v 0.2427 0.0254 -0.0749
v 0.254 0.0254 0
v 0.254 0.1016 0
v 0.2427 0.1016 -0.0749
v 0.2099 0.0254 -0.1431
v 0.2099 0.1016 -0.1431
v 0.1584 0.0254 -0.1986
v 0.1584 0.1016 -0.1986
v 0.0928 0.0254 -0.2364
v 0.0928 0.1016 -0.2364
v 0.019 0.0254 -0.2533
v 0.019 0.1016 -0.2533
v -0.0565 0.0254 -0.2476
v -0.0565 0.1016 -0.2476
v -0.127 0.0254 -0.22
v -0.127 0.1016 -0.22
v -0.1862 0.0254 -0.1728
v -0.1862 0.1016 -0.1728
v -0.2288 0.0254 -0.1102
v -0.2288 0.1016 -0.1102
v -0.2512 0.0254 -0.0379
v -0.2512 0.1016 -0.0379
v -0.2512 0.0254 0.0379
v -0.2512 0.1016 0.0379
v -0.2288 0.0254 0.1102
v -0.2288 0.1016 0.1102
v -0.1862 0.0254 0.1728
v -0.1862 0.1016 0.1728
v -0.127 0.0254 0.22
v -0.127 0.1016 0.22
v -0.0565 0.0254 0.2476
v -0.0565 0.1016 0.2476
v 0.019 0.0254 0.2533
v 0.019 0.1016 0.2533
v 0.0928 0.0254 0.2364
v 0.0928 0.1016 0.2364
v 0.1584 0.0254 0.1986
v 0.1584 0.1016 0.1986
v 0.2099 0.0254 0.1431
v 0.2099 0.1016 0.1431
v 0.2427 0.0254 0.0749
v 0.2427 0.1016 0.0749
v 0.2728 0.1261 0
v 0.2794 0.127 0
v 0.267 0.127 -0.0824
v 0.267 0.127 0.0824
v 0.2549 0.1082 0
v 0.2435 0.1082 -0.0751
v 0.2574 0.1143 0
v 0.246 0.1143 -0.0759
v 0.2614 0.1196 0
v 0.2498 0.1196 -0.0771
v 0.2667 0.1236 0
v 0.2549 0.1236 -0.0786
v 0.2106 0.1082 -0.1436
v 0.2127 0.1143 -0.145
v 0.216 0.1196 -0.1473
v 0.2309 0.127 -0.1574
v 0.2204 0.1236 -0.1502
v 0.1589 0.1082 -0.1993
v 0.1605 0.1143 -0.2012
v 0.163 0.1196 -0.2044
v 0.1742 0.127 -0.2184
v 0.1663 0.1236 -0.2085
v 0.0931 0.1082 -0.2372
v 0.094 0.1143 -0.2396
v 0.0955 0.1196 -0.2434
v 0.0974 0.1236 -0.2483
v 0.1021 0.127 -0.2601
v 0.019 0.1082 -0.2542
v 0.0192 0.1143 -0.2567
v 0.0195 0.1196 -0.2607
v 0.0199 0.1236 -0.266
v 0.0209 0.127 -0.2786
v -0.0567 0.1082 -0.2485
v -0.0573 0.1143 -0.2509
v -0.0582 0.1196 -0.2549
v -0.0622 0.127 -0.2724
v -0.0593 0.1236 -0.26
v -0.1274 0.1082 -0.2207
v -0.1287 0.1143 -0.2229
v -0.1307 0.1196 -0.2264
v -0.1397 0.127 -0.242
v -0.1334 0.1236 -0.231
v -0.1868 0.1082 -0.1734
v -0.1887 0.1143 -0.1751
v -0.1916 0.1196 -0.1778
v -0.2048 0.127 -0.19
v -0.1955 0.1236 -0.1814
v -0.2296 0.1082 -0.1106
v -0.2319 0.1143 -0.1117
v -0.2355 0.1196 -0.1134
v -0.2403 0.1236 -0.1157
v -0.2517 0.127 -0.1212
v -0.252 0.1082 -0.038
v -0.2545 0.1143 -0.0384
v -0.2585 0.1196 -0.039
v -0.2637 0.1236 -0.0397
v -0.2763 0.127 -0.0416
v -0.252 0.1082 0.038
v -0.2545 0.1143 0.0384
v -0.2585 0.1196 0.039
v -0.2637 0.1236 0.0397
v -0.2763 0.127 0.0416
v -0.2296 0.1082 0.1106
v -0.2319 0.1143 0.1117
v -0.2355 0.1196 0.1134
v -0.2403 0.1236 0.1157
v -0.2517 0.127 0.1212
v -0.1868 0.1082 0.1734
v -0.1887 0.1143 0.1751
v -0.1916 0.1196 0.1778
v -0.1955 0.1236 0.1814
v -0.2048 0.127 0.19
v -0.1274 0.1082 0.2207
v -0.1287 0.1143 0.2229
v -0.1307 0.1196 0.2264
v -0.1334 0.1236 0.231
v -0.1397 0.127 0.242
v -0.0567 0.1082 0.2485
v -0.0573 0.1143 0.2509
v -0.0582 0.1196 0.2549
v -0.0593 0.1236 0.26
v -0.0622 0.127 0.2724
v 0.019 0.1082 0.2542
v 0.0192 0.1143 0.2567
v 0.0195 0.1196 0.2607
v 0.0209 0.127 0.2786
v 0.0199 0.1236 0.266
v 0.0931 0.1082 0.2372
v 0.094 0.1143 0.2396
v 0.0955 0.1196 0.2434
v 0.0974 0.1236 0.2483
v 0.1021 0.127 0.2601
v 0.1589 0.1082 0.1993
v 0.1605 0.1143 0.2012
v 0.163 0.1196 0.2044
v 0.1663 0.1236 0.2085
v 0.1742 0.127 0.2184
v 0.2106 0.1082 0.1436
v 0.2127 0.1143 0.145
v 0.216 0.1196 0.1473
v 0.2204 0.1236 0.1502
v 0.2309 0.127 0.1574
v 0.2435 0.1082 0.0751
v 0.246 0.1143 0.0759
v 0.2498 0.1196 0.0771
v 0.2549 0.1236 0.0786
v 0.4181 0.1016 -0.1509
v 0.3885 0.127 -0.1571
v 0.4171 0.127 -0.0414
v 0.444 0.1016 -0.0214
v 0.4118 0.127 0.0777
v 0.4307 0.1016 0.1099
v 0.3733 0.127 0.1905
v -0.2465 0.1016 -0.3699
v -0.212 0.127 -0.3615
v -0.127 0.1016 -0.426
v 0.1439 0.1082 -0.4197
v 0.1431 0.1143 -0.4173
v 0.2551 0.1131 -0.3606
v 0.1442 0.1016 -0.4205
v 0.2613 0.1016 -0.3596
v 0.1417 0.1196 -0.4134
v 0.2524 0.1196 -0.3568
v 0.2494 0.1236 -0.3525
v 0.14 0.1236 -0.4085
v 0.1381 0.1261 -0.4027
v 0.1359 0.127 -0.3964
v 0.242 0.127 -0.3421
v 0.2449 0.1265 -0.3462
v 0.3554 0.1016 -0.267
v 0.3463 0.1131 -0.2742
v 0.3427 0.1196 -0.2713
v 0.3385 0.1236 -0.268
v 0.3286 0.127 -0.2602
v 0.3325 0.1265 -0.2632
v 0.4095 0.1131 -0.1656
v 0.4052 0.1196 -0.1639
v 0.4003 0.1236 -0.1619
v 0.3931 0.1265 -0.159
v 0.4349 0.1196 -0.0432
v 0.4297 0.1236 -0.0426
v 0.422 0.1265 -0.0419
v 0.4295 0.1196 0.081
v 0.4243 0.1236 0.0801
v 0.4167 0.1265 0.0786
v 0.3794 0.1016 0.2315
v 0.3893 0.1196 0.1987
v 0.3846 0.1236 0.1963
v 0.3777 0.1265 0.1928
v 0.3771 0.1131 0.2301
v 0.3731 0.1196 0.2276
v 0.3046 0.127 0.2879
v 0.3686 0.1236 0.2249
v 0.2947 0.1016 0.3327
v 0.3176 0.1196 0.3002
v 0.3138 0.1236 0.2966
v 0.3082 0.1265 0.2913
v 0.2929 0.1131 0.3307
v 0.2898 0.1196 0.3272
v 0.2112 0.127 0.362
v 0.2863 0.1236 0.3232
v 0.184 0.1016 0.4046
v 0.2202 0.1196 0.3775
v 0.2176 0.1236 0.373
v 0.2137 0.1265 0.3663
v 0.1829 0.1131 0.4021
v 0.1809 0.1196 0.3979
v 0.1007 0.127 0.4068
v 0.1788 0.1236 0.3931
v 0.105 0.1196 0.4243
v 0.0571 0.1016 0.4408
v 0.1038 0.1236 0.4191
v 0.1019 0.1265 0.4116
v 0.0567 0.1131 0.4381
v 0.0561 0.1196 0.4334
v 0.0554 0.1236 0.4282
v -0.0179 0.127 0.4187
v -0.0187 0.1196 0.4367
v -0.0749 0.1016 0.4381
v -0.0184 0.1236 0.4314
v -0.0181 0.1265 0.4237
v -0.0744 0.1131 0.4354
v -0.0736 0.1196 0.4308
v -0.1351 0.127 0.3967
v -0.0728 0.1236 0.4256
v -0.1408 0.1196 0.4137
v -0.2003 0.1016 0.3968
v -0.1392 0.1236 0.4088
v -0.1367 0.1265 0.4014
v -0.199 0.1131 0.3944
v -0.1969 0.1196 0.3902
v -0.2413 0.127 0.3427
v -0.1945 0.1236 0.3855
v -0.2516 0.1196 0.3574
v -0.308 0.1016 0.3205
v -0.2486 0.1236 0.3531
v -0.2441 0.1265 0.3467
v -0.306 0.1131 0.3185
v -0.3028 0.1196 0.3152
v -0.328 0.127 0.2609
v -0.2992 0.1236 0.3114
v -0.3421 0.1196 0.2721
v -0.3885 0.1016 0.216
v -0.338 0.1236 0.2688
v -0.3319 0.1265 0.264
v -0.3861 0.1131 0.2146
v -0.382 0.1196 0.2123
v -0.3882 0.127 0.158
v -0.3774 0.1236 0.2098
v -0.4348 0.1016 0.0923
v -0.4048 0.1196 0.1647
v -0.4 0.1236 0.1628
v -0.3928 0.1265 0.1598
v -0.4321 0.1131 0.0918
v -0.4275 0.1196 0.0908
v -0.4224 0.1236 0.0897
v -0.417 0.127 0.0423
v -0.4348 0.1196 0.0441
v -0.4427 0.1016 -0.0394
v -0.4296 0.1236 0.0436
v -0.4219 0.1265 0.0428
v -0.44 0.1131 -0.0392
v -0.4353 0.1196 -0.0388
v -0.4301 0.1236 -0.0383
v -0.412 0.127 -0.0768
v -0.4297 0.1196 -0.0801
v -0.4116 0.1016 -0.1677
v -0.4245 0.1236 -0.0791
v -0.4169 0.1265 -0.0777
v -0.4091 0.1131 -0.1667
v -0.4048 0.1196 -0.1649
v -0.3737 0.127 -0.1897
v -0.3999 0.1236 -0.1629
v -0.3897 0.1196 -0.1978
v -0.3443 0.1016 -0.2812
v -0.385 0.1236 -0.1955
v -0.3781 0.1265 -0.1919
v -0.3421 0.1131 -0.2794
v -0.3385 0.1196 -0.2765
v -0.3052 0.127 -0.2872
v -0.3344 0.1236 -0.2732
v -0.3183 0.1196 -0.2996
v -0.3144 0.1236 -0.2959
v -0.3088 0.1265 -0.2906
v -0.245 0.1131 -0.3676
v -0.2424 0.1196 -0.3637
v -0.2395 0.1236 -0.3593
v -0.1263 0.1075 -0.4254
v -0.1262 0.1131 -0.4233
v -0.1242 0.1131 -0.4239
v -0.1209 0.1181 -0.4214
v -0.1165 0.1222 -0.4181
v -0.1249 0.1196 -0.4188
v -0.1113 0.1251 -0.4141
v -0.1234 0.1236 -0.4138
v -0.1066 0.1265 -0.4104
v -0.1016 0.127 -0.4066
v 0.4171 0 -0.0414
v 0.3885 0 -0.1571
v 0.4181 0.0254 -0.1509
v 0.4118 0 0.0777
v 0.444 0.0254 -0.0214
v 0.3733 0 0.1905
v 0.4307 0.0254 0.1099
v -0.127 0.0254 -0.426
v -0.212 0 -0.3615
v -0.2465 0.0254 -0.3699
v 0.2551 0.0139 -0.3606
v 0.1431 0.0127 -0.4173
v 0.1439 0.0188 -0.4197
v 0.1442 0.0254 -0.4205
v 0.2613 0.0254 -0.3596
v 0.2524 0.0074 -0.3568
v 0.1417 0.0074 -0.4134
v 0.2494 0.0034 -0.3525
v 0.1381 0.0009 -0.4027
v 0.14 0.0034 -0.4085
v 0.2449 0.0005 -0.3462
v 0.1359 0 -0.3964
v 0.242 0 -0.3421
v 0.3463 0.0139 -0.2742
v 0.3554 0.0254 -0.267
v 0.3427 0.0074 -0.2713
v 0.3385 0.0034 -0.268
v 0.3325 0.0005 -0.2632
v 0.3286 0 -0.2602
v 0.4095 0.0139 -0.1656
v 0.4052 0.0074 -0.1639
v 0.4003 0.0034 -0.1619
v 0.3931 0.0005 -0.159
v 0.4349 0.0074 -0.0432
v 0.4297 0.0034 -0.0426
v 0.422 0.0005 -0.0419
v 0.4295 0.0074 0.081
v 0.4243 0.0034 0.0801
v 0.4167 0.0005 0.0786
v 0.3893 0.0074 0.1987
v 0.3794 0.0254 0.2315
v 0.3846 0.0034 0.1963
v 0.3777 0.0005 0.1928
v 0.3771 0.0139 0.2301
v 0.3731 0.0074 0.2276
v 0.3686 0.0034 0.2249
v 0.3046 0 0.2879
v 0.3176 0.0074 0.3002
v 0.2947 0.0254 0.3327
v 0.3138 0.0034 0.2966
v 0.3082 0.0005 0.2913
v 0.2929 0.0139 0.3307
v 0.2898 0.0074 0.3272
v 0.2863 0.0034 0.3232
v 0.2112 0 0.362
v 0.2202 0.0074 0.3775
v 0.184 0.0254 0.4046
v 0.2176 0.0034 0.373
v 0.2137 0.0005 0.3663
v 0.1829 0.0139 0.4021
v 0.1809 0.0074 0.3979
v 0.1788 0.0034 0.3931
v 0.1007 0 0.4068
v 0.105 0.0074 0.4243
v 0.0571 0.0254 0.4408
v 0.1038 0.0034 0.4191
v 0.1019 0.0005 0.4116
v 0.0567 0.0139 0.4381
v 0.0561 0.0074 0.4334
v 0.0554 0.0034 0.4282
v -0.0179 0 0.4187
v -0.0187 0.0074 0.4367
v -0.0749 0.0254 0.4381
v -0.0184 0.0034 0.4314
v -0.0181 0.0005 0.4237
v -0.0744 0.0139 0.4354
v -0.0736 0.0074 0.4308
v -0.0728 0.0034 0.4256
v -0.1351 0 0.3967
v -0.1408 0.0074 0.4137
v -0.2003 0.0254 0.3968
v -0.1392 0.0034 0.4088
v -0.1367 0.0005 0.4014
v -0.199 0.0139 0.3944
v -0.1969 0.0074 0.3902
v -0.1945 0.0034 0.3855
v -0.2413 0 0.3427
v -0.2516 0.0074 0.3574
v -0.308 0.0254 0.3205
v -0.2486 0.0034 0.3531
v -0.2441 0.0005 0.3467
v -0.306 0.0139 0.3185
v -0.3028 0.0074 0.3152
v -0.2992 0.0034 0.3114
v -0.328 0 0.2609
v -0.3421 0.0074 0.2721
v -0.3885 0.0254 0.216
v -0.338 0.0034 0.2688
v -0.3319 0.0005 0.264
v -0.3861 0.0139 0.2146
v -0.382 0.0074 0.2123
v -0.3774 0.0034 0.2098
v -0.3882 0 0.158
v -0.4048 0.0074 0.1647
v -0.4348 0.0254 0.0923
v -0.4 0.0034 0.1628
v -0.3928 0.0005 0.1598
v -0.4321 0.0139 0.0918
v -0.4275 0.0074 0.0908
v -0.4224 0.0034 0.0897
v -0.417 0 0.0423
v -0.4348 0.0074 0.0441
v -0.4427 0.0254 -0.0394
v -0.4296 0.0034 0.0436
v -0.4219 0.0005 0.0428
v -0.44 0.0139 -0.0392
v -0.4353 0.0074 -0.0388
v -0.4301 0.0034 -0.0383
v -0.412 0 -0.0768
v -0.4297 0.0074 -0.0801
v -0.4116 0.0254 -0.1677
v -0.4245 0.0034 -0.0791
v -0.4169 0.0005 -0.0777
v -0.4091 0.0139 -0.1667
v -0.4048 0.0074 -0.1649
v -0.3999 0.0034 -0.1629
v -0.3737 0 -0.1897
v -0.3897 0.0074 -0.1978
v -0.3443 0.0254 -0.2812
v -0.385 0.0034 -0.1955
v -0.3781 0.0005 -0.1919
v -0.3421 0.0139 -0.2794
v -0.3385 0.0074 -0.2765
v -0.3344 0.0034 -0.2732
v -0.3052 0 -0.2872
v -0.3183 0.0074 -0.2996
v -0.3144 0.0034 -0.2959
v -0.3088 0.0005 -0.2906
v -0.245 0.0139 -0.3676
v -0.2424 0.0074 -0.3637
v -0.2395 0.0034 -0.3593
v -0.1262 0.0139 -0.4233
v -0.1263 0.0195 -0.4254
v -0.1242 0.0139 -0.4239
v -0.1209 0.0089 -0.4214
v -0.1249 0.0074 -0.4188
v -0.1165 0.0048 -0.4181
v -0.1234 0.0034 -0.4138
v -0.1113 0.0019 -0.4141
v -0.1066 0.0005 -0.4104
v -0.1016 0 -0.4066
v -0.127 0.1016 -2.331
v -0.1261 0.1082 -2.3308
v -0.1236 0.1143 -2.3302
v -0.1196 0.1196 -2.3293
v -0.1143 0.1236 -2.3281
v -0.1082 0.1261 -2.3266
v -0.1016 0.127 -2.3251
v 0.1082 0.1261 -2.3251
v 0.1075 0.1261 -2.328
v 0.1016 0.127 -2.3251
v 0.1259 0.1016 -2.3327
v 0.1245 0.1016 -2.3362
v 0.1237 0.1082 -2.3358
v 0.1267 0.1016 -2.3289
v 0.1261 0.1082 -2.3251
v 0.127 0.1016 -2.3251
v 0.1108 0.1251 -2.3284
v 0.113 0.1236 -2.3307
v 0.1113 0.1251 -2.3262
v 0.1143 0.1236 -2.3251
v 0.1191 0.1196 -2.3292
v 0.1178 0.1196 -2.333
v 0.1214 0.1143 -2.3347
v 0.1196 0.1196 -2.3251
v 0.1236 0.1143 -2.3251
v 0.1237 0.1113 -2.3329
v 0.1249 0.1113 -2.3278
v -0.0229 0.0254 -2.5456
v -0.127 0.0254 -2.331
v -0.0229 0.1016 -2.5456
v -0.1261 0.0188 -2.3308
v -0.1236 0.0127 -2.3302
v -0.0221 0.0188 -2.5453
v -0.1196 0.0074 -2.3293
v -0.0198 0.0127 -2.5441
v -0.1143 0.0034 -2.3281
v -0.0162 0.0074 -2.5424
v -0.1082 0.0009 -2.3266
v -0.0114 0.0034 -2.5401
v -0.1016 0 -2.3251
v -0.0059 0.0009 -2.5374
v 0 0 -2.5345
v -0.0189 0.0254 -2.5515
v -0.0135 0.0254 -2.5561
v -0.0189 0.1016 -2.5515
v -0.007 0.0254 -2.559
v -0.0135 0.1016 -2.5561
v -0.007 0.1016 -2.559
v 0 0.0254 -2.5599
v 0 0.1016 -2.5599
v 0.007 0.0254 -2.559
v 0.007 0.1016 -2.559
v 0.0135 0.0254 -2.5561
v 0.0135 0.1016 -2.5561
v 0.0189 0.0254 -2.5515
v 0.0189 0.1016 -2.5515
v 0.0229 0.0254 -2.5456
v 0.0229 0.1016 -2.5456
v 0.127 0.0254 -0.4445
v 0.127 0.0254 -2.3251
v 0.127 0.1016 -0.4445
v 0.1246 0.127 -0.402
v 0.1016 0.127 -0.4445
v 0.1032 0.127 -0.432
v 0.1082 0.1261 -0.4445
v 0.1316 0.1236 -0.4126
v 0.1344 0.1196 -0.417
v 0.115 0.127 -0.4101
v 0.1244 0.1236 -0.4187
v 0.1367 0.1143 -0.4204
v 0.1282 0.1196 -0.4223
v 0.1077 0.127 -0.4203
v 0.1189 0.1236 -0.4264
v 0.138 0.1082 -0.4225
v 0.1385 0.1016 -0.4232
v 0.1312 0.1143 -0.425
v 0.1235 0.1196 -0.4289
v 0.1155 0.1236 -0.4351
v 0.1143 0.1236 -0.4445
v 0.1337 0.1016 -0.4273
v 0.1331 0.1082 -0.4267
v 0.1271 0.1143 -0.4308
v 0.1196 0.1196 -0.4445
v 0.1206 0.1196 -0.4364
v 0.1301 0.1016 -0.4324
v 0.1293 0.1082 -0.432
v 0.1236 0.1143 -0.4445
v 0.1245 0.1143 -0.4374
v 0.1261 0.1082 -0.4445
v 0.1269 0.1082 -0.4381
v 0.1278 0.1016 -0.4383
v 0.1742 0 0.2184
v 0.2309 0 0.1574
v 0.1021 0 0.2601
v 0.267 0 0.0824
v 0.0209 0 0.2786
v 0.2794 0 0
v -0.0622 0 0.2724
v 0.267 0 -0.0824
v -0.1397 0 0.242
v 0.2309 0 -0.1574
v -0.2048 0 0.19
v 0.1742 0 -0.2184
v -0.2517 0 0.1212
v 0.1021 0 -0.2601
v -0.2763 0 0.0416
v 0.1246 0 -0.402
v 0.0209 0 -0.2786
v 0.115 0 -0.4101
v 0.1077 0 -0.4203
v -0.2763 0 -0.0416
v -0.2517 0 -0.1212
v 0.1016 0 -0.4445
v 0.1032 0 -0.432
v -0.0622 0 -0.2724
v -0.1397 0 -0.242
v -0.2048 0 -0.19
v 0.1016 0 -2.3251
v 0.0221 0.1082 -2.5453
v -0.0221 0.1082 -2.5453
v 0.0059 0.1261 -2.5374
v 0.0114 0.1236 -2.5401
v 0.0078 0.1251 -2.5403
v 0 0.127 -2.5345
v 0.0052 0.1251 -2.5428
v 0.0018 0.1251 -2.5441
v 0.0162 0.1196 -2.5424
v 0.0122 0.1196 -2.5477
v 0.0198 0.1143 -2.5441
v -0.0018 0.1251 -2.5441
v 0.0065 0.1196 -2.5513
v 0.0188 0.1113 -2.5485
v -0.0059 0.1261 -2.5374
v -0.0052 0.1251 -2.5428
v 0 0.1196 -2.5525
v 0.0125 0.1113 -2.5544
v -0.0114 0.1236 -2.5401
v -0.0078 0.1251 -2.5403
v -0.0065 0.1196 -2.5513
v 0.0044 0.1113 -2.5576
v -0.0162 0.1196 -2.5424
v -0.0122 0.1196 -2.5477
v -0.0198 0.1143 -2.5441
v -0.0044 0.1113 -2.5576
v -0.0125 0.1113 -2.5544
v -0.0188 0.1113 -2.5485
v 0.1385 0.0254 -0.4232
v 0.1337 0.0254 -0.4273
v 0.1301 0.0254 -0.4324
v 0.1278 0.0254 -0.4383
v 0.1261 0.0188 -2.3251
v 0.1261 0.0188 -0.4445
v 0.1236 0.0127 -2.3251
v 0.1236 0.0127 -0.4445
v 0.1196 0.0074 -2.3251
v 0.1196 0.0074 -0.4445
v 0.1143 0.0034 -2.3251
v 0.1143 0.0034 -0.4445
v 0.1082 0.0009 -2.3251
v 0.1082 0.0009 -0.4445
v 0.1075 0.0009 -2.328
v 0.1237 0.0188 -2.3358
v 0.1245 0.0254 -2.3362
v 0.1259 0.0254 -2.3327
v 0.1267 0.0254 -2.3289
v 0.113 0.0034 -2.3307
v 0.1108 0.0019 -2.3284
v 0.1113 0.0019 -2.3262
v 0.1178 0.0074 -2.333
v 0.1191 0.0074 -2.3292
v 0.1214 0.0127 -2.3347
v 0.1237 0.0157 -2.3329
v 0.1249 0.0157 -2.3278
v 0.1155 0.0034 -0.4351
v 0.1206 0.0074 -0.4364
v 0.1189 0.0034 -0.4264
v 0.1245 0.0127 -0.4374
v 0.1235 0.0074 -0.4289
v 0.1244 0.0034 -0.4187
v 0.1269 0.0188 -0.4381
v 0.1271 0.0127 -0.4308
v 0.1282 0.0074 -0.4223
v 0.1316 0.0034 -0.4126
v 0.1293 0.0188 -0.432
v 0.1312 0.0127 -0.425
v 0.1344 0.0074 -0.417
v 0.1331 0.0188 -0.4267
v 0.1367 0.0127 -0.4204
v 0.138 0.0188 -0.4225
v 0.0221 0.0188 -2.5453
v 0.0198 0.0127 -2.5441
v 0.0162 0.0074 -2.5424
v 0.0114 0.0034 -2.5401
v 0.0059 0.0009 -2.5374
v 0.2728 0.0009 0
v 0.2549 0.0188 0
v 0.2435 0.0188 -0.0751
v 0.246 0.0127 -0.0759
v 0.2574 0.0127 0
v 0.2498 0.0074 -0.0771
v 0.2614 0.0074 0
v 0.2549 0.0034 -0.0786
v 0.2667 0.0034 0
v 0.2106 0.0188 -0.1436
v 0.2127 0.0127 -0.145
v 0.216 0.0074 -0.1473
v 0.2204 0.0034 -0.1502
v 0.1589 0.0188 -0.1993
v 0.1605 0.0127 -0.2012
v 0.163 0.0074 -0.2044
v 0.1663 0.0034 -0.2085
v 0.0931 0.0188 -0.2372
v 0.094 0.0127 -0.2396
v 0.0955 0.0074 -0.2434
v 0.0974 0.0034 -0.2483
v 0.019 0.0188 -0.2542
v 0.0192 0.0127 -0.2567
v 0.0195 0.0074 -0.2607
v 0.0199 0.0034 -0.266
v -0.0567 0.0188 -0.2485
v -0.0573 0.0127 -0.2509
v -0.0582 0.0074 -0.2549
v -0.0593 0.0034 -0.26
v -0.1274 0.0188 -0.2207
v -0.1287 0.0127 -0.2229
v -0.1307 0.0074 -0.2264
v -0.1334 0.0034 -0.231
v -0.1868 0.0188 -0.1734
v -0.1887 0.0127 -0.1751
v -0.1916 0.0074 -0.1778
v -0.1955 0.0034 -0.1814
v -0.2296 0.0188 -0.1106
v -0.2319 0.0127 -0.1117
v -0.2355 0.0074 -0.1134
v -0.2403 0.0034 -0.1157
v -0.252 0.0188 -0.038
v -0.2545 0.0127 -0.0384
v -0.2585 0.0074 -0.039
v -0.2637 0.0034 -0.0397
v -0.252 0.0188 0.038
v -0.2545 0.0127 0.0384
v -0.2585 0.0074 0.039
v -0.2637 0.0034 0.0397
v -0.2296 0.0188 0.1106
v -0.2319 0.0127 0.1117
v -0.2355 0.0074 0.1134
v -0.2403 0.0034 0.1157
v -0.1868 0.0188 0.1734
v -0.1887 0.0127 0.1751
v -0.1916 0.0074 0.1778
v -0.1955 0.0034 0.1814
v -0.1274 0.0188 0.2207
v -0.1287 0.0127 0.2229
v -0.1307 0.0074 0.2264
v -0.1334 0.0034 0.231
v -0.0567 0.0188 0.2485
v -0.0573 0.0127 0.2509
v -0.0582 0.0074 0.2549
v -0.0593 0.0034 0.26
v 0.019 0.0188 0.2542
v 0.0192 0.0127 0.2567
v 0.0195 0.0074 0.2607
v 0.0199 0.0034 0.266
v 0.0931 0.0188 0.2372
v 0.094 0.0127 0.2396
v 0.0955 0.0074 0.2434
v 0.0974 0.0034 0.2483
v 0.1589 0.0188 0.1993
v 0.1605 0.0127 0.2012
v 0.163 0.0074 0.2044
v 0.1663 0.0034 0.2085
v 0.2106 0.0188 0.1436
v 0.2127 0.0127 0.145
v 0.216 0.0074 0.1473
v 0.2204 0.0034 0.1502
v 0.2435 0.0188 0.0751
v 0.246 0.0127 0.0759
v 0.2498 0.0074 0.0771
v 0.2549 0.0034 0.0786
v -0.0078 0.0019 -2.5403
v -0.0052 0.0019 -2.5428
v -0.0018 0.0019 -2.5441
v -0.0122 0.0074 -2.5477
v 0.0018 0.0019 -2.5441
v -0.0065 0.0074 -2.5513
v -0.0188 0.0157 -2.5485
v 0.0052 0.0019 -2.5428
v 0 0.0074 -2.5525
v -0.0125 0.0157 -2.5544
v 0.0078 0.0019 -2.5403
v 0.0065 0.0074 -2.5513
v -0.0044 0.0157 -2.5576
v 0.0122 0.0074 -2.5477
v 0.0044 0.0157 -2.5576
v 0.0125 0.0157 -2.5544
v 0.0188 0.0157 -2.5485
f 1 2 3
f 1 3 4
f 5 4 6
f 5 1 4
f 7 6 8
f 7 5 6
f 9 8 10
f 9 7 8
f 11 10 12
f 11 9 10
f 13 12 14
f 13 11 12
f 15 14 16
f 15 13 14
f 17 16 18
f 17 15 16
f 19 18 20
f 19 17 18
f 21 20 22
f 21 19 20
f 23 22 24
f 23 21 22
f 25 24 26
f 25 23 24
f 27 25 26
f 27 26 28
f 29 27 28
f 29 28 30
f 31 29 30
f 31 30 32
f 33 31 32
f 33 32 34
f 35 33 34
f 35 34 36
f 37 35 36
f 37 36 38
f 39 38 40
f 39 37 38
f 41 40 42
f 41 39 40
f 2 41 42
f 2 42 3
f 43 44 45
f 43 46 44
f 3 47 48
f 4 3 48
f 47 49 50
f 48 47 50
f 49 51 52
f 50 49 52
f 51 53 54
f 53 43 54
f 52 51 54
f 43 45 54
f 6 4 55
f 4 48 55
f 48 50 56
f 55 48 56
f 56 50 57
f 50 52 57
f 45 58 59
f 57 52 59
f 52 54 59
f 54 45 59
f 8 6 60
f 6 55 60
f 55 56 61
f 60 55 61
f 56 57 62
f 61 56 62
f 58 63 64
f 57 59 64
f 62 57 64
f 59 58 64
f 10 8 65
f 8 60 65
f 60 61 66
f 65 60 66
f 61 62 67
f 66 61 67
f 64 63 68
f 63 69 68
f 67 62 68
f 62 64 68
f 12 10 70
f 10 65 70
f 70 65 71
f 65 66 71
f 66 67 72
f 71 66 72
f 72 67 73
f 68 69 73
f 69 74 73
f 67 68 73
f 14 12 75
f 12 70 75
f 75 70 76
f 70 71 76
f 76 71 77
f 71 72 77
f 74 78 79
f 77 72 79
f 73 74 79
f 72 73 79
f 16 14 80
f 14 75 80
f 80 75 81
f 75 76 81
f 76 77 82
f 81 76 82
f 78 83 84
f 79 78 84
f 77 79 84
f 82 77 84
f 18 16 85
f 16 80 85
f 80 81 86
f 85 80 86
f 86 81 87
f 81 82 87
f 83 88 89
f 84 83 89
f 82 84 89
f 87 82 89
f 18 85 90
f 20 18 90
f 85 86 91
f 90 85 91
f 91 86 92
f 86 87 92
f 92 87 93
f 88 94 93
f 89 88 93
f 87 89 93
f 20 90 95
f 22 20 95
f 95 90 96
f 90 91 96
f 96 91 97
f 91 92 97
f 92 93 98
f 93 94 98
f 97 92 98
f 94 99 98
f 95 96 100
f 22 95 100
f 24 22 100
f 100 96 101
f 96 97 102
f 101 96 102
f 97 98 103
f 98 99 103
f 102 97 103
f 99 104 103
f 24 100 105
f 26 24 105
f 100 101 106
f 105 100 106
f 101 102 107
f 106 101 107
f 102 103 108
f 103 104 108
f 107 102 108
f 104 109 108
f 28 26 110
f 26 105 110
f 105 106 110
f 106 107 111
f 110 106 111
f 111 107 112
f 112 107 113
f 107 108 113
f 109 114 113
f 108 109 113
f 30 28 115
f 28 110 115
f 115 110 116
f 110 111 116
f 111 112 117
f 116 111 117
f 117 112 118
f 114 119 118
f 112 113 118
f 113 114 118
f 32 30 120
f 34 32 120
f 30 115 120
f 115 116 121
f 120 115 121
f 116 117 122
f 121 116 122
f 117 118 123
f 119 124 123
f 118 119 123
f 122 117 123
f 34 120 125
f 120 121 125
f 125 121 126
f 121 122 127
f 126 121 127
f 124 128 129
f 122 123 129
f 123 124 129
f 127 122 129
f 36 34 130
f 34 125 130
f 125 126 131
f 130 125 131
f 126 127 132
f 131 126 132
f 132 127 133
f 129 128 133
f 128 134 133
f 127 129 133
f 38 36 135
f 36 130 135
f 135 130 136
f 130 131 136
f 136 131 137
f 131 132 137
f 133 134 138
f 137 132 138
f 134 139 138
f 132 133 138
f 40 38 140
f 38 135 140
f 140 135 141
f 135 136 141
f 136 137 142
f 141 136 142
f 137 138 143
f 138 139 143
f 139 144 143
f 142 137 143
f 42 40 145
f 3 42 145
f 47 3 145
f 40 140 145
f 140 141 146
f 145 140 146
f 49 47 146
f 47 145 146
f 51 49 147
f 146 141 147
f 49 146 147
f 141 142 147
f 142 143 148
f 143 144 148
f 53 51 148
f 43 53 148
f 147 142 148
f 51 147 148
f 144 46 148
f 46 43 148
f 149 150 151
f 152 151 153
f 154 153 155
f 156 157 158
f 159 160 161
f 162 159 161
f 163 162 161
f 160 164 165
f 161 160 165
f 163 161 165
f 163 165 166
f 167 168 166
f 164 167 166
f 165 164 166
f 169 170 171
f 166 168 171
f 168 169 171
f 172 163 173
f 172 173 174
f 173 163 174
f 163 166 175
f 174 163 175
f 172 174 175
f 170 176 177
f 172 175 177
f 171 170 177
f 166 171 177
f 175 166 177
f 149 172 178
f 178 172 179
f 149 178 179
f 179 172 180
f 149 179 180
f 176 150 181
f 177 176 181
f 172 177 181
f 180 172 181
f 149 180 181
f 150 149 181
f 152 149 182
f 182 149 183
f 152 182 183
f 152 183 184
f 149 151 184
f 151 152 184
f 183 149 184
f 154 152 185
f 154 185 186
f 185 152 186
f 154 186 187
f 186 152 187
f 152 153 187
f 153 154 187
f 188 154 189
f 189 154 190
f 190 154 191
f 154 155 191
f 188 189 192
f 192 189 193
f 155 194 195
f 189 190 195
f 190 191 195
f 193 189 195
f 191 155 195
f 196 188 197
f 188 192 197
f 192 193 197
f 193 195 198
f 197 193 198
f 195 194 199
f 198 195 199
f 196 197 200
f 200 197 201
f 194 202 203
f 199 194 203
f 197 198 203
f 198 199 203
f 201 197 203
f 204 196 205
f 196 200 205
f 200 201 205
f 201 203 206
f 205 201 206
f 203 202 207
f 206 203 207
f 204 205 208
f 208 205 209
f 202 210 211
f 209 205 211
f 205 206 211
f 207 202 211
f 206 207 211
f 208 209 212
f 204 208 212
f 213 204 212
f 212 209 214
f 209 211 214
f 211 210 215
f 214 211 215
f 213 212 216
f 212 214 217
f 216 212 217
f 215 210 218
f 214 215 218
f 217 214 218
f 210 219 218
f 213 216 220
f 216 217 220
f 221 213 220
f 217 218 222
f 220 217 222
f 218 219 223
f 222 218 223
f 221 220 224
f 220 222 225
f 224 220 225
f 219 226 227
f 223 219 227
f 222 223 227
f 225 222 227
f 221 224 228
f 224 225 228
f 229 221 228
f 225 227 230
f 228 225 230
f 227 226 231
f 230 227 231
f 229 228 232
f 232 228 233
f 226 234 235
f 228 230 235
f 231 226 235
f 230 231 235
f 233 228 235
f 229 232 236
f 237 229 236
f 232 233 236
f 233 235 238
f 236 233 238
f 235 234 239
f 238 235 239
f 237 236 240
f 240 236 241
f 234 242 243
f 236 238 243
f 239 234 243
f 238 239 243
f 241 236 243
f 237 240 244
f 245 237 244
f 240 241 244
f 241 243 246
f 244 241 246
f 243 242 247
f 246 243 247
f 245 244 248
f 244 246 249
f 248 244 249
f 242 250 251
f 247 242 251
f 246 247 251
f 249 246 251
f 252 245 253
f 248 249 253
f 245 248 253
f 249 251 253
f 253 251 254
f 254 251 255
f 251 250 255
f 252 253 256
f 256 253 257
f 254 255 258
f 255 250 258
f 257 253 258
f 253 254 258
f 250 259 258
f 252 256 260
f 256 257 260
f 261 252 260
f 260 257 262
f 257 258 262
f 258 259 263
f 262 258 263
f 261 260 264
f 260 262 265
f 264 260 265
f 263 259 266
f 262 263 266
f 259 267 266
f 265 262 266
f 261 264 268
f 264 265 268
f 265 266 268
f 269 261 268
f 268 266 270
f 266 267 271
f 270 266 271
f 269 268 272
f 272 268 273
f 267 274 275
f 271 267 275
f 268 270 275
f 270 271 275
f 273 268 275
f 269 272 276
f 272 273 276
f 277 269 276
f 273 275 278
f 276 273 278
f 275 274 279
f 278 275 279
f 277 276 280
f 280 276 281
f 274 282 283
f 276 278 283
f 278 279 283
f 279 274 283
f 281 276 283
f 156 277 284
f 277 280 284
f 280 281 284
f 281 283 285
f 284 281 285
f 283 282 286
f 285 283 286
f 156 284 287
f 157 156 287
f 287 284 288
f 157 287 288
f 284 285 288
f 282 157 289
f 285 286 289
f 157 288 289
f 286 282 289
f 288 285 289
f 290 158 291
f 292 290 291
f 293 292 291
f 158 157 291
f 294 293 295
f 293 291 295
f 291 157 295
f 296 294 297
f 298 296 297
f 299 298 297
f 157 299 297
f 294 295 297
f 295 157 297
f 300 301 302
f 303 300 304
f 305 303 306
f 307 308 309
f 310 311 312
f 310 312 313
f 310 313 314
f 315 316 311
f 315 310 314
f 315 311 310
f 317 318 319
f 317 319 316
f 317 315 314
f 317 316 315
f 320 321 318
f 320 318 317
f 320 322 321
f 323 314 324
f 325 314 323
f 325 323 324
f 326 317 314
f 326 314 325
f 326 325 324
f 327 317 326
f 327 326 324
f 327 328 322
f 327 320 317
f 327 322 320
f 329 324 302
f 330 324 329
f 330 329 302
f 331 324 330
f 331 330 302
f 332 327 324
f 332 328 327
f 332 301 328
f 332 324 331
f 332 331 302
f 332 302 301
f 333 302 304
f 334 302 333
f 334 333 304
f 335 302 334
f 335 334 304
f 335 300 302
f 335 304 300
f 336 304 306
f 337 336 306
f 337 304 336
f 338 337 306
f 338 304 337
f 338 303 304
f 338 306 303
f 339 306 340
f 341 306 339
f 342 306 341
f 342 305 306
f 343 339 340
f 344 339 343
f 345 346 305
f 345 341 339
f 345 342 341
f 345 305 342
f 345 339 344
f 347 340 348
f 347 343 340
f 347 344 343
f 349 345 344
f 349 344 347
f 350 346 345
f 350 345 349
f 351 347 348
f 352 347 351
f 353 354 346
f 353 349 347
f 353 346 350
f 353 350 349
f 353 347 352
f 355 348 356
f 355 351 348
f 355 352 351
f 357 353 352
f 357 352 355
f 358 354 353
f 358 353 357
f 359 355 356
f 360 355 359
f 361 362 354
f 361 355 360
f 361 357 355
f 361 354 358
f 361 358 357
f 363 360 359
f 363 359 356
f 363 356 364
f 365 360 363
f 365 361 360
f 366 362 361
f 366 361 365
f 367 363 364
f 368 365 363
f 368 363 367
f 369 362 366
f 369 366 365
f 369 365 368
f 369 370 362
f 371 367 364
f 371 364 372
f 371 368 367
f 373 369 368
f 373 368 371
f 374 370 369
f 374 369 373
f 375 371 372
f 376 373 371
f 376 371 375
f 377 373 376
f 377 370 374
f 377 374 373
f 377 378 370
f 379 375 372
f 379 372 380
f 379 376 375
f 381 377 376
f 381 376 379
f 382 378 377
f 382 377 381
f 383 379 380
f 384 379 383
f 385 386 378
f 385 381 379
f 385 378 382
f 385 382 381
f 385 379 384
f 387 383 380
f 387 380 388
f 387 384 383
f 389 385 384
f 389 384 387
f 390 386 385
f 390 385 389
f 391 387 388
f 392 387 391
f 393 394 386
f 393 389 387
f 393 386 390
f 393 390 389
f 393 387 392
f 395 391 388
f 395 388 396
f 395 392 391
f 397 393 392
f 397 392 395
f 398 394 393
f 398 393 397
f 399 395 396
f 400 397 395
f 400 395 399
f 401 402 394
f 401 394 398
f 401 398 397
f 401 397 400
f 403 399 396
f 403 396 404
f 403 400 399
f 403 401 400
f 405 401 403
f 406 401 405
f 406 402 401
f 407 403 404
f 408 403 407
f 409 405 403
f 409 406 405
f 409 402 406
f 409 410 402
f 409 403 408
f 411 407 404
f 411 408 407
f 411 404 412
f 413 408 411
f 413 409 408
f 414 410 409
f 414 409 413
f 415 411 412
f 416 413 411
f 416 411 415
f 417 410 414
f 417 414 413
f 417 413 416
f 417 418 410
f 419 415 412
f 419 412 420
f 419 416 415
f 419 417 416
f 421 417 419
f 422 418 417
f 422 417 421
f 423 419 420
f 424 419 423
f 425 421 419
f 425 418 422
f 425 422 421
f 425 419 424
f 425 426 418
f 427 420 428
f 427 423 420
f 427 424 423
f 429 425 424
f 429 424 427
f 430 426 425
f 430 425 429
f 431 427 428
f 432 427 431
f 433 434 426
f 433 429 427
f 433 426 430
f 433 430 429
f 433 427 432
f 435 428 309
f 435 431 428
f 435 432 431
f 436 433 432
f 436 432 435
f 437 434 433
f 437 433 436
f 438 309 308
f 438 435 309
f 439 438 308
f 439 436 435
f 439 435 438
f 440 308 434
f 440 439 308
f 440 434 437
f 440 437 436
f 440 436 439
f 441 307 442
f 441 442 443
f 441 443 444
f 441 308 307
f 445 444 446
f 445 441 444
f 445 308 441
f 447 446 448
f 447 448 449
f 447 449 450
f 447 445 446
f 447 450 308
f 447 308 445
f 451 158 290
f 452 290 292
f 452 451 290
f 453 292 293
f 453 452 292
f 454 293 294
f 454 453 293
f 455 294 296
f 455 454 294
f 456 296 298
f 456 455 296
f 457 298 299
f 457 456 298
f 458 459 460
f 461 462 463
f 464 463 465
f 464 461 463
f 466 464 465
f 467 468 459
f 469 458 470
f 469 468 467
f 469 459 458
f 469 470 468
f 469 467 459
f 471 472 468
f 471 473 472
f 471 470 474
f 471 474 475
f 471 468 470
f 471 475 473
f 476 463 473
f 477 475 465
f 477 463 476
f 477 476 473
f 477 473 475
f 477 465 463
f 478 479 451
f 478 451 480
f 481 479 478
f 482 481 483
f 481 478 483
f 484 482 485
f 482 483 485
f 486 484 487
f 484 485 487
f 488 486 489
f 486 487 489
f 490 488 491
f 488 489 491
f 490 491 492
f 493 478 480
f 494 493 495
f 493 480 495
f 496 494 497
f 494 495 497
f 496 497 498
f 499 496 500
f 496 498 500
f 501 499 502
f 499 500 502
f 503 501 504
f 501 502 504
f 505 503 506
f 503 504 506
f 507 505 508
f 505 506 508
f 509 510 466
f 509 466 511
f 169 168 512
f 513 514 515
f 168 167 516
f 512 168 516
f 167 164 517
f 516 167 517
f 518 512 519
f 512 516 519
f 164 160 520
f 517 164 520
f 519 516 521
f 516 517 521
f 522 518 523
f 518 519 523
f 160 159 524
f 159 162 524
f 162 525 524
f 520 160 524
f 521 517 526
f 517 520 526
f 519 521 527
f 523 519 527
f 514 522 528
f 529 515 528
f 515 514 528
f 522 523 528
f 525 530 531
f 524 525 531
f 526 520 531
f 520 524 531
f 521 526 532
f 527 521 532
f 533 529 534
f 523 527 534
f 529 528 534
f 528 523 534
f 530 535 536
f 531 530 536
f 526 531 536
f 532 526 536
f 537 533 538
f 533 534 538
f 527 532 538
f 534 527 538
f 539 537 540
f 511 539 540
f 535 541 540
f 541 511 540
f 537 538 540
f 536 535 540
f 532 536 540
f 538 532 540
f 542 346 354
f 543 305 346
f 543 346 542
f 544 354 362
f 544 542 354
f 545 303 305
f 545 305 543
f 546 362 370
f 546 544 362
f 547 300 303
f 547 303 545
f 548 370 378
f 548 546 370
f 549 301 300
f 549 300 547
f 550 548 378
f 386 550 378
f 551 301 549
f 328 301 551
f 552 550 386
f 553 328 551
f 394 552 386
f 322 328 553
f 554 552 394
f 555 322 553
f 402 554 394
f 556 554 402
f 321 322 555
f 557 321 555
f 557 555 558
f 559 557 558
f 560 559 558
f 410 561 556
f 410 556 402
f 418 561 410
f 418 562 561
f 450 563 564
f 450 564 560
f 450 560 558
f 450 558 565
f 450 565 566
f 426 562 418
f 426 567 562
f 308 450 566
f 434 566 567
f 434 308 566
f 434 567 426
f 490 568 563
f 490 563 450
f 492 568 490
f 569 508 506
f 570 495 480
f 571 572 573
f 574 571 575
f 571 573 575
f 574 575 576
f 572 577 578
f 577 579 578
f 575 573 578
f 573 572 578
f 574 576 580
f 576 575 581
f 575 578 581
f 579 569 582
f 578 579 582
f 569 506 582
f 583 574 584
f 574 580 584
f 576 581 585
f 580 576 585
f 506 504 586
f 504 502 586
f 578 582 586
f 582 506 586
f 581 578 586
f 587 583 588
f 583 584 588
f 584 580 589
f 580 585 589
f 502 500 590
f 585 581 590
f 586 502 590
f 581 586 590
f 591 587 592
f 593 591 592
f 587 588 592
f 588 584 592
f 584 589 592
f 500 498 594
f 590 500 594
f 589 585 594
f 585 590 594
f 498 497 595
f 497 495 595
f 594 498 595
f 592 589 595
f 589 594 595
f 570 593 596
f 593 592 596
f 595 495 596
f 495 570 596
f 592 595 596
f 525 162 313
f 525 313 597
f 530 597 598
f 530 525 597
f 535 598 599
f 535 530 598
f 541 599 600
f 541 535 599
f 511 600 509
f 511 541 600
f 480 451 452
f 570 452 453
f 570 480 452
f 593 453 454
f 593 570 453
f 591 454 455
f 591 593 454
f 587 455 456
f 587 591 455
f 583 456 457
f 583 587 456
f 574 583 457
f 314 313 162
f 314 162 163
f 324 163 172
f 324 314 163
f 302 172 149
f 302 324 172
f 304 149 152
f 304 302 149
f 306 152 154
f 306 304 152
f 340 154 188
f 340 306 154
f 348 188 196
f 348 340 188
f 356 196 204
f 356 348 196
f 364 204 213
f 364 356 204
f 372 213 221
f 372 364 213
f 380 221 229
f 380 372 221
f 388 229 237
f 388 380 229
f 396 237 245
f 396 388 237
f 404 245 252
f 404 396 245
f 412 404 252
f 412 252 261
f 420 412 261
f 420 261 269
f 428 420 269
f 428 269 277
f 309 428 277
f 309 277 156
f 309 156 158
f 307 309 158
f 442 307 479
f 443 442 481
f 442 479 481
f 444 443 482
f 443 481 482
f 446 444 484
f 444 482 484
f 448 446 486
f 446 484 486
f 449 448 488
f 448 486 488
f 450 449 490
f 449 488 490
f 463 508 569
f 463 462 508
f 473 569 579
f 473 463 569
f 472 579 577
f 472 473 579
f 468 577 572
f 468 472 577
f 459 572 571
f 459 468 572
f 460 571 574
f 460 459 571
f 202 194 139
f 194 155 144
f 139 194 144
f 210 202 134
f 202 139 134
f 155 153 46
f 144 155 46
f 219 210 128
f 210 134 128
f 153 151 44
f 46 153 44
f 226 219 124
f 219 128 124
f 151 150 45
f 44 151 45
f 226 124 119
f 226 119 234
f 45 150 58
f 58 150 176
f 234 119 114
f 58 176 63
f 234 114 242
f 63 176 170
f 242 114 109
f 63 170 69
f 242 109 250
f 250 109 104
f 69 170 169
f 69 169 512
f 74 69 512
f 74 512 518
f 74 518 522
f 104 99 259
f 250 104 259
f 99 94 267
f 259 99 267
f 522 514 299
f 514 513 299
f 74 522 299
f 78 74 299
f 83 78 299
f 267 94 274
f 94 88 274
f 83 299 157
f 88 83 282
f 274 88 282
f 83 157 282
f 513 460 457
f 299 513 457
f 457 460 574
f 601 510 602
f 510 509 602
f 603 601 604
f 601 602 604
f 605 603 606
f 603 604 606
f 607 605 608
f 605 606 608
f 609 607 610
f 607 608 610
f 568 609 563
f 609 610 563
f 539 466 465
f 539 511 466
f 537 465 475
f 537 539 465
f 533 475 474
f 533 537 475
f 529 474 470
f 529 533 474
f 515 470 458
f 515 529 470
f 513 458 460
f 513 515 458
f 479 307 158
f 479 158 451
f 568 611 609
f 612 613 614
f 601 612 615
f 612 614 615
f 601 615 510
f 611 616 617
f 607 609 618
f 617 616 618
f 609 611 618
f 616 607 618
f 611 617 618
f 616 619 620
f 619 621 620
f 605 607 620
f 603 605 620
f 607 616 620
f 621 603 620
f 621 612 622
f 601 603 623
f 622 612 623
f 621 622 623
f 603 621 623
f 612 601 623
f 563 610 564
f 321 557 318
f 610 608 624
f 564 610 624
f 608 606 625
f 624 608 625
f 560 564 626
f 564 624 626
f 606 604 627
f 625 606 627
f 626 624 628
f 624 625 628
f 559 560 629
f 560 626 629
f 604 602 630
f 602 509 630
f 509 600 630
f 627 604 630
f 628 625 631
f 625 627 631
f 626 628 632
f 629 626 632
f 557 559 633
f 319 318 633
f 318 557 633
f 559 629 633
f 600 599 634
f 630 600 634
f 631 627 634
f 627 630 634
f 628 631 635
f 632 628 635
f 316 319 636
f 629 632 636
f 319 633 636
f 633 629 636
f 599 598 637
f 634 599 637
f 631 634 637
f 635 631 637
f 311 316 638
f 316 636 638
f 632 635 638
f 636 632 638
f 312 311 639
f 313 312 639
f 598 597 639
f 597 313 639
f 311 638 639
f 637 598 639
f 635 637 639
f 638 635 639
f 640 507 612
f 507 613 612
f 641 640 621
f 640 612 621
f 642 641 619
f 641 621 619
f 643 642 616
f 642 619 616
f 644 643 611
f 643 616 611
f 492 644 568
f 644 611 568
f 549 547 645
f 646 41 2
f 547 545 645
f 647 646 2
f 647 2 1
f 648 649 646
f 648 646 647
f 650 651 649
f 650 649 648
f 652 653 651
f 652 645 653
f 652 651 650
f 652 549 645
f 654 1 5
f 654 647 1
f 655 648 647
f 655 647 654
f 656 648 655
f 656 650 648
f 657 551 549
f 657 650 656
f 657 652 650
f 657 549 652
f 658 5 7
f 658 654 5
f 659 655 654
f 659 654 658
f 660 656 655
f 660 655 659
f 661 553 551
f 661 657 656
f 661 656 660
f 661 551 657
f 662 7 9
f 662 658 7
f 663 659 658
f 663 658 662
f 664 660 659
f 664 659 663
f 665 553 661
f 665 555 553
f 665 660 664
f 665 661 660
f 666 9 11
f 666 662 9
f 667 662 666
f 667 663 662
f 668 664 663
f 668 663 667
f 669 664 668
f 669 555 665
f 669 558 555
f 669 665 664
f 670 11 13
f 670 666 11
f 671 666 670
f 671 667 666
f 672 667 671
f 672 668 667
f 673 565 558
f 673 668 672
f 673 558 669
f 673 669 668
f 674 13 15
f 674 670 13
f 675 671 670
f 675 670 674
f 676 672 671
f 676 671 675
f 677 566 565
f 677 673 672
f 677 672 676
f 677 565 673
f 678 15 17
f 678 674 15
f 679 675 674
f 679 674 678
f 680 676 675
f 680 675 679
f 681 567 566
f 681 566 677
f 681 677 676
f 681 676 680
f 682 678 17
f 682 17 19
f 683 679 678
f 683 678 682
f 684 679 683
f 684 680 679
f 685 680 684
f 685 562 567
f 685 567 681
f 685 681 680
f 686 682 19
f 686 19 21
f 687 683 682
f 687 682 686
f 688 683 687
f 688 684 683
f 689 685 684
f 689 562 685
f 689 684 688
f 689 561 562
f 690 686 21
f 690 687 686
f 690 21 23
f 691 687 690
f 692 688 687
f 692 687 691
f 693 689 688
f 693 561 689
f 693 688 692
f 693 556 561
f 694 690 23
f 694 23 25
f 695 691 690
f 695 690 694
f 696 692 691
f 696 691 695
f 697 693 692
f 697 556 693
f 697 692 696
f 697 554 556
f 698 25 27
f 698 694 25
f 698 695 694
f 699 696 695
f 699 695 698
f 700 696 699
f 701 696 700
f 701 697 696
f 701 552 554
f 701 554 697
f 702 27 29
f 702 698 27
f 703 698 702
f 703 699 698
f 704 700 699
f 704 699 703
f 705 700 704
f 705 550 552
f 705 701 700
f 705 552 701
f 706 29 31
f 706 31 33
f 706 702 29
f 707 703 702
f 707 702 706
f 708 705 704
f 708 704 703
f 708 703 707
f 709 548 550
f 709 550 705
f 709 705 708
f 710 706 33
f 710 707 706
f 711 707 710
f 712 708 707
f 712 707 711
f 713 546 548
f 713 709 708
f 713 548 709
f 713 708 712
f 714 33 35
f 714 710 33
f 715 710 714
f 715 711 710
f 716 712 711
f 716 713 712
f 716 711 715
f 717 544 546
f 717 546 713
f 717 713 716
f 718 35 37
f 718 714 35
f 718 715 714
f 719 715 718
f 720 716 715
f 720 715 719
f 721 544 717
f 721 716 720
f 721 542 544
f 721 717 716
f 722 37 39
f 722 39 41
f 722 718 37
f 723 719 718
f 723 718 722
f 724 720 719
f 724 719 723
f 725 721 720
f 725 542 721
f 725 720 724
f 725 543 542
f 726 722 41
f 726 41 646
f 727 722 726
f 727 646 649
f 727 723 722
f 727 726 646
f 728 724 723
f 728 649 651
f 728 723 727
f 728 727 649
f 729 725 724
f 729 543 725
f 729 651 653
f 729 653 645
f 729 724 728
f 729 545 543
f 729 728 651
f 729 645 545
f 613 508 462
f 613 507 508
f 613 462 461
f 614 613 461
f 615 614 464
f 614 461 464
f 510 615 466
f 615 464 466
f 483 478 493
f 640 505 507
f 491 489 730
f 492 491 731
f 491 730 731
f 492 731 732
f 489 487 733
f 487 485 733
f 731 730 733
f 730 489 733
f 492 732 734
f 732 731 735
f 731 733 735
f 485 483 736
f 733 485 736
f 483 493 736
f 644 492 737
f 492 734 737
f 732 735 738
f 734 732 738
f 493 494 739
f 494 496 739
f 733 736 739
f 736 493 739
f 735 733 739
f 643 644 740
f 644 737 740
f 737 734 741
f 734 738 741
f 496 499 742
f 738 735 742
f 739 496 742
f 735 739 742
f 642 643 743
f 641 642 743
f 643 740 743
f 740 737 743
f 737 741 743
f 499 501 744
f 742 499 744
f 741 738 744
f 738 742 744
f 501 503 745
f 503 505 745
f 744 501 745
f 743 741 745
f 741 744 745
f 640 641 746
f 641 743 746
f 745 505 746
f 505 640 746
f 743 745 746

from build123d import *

# Parameters (mm, degrees)
SKETCH1_R      = 0.254
EXTRUDE1_DEPTH = 0.127
FILLET1_R      = 0.0254


with BuildPart() as part:
    # Sketch1 → Extrude1 (new body)
    with BuildSketch(Plane(origin=(0, 0, 0), x_dir=(1, 0, 0), z_dir=(0, 1, 0))):
        with BuildLine():
            Line((-0.127, 2.33097095), (0, 2.592734318))
            Line((0, 2.592734318), (0.127, 2.33097095))
            Line((0.127, 2.33097095), (0.127, 0.42597095))
            ThreePointArc((0.127, 0.42597095), (0, -0.4445), (-0.127, 0.42597095))
            Line((-0.127, 0.42597095), (-0.127, 2.33097095))
        make_face()
        Circle(SKETCH1_R, mode=Mode.SUBTRACT)
    extrude(amount=EXTRUDE1_DEPTH)

    # Fillet1
    fillet1_edges = [part.edges().sort_by_distance(p)[0] for p in [
        (0.0635, 0.127, -2.461852634),
        (-0.0635, 0.127, -2.461852634),
        (-0.254, 0, 0),
        (-0.254, 0.127, 0),
        (-0.127, 0.127, -1.37847095),
        (0, 0.127, 0.4445),
        (-0.127, 0, -1.37847095),
        (-0.0635, 0, -2.461852634),
        (0.0635, 0, -2.461852634),
        (0.127, 0, -1.37847095),
        (0, 0, 0.4445),
        (0.127, 0.127, -1.37847095),
        (0, 0.0635, -2.592734318),
        (0.127, 0.0635, -2.33097095),
        (0.127, 0.0635, -0.42597095),
    ]]
    fillet(fillet1_edges, radius=FILLET1_R)


solid = part.part
